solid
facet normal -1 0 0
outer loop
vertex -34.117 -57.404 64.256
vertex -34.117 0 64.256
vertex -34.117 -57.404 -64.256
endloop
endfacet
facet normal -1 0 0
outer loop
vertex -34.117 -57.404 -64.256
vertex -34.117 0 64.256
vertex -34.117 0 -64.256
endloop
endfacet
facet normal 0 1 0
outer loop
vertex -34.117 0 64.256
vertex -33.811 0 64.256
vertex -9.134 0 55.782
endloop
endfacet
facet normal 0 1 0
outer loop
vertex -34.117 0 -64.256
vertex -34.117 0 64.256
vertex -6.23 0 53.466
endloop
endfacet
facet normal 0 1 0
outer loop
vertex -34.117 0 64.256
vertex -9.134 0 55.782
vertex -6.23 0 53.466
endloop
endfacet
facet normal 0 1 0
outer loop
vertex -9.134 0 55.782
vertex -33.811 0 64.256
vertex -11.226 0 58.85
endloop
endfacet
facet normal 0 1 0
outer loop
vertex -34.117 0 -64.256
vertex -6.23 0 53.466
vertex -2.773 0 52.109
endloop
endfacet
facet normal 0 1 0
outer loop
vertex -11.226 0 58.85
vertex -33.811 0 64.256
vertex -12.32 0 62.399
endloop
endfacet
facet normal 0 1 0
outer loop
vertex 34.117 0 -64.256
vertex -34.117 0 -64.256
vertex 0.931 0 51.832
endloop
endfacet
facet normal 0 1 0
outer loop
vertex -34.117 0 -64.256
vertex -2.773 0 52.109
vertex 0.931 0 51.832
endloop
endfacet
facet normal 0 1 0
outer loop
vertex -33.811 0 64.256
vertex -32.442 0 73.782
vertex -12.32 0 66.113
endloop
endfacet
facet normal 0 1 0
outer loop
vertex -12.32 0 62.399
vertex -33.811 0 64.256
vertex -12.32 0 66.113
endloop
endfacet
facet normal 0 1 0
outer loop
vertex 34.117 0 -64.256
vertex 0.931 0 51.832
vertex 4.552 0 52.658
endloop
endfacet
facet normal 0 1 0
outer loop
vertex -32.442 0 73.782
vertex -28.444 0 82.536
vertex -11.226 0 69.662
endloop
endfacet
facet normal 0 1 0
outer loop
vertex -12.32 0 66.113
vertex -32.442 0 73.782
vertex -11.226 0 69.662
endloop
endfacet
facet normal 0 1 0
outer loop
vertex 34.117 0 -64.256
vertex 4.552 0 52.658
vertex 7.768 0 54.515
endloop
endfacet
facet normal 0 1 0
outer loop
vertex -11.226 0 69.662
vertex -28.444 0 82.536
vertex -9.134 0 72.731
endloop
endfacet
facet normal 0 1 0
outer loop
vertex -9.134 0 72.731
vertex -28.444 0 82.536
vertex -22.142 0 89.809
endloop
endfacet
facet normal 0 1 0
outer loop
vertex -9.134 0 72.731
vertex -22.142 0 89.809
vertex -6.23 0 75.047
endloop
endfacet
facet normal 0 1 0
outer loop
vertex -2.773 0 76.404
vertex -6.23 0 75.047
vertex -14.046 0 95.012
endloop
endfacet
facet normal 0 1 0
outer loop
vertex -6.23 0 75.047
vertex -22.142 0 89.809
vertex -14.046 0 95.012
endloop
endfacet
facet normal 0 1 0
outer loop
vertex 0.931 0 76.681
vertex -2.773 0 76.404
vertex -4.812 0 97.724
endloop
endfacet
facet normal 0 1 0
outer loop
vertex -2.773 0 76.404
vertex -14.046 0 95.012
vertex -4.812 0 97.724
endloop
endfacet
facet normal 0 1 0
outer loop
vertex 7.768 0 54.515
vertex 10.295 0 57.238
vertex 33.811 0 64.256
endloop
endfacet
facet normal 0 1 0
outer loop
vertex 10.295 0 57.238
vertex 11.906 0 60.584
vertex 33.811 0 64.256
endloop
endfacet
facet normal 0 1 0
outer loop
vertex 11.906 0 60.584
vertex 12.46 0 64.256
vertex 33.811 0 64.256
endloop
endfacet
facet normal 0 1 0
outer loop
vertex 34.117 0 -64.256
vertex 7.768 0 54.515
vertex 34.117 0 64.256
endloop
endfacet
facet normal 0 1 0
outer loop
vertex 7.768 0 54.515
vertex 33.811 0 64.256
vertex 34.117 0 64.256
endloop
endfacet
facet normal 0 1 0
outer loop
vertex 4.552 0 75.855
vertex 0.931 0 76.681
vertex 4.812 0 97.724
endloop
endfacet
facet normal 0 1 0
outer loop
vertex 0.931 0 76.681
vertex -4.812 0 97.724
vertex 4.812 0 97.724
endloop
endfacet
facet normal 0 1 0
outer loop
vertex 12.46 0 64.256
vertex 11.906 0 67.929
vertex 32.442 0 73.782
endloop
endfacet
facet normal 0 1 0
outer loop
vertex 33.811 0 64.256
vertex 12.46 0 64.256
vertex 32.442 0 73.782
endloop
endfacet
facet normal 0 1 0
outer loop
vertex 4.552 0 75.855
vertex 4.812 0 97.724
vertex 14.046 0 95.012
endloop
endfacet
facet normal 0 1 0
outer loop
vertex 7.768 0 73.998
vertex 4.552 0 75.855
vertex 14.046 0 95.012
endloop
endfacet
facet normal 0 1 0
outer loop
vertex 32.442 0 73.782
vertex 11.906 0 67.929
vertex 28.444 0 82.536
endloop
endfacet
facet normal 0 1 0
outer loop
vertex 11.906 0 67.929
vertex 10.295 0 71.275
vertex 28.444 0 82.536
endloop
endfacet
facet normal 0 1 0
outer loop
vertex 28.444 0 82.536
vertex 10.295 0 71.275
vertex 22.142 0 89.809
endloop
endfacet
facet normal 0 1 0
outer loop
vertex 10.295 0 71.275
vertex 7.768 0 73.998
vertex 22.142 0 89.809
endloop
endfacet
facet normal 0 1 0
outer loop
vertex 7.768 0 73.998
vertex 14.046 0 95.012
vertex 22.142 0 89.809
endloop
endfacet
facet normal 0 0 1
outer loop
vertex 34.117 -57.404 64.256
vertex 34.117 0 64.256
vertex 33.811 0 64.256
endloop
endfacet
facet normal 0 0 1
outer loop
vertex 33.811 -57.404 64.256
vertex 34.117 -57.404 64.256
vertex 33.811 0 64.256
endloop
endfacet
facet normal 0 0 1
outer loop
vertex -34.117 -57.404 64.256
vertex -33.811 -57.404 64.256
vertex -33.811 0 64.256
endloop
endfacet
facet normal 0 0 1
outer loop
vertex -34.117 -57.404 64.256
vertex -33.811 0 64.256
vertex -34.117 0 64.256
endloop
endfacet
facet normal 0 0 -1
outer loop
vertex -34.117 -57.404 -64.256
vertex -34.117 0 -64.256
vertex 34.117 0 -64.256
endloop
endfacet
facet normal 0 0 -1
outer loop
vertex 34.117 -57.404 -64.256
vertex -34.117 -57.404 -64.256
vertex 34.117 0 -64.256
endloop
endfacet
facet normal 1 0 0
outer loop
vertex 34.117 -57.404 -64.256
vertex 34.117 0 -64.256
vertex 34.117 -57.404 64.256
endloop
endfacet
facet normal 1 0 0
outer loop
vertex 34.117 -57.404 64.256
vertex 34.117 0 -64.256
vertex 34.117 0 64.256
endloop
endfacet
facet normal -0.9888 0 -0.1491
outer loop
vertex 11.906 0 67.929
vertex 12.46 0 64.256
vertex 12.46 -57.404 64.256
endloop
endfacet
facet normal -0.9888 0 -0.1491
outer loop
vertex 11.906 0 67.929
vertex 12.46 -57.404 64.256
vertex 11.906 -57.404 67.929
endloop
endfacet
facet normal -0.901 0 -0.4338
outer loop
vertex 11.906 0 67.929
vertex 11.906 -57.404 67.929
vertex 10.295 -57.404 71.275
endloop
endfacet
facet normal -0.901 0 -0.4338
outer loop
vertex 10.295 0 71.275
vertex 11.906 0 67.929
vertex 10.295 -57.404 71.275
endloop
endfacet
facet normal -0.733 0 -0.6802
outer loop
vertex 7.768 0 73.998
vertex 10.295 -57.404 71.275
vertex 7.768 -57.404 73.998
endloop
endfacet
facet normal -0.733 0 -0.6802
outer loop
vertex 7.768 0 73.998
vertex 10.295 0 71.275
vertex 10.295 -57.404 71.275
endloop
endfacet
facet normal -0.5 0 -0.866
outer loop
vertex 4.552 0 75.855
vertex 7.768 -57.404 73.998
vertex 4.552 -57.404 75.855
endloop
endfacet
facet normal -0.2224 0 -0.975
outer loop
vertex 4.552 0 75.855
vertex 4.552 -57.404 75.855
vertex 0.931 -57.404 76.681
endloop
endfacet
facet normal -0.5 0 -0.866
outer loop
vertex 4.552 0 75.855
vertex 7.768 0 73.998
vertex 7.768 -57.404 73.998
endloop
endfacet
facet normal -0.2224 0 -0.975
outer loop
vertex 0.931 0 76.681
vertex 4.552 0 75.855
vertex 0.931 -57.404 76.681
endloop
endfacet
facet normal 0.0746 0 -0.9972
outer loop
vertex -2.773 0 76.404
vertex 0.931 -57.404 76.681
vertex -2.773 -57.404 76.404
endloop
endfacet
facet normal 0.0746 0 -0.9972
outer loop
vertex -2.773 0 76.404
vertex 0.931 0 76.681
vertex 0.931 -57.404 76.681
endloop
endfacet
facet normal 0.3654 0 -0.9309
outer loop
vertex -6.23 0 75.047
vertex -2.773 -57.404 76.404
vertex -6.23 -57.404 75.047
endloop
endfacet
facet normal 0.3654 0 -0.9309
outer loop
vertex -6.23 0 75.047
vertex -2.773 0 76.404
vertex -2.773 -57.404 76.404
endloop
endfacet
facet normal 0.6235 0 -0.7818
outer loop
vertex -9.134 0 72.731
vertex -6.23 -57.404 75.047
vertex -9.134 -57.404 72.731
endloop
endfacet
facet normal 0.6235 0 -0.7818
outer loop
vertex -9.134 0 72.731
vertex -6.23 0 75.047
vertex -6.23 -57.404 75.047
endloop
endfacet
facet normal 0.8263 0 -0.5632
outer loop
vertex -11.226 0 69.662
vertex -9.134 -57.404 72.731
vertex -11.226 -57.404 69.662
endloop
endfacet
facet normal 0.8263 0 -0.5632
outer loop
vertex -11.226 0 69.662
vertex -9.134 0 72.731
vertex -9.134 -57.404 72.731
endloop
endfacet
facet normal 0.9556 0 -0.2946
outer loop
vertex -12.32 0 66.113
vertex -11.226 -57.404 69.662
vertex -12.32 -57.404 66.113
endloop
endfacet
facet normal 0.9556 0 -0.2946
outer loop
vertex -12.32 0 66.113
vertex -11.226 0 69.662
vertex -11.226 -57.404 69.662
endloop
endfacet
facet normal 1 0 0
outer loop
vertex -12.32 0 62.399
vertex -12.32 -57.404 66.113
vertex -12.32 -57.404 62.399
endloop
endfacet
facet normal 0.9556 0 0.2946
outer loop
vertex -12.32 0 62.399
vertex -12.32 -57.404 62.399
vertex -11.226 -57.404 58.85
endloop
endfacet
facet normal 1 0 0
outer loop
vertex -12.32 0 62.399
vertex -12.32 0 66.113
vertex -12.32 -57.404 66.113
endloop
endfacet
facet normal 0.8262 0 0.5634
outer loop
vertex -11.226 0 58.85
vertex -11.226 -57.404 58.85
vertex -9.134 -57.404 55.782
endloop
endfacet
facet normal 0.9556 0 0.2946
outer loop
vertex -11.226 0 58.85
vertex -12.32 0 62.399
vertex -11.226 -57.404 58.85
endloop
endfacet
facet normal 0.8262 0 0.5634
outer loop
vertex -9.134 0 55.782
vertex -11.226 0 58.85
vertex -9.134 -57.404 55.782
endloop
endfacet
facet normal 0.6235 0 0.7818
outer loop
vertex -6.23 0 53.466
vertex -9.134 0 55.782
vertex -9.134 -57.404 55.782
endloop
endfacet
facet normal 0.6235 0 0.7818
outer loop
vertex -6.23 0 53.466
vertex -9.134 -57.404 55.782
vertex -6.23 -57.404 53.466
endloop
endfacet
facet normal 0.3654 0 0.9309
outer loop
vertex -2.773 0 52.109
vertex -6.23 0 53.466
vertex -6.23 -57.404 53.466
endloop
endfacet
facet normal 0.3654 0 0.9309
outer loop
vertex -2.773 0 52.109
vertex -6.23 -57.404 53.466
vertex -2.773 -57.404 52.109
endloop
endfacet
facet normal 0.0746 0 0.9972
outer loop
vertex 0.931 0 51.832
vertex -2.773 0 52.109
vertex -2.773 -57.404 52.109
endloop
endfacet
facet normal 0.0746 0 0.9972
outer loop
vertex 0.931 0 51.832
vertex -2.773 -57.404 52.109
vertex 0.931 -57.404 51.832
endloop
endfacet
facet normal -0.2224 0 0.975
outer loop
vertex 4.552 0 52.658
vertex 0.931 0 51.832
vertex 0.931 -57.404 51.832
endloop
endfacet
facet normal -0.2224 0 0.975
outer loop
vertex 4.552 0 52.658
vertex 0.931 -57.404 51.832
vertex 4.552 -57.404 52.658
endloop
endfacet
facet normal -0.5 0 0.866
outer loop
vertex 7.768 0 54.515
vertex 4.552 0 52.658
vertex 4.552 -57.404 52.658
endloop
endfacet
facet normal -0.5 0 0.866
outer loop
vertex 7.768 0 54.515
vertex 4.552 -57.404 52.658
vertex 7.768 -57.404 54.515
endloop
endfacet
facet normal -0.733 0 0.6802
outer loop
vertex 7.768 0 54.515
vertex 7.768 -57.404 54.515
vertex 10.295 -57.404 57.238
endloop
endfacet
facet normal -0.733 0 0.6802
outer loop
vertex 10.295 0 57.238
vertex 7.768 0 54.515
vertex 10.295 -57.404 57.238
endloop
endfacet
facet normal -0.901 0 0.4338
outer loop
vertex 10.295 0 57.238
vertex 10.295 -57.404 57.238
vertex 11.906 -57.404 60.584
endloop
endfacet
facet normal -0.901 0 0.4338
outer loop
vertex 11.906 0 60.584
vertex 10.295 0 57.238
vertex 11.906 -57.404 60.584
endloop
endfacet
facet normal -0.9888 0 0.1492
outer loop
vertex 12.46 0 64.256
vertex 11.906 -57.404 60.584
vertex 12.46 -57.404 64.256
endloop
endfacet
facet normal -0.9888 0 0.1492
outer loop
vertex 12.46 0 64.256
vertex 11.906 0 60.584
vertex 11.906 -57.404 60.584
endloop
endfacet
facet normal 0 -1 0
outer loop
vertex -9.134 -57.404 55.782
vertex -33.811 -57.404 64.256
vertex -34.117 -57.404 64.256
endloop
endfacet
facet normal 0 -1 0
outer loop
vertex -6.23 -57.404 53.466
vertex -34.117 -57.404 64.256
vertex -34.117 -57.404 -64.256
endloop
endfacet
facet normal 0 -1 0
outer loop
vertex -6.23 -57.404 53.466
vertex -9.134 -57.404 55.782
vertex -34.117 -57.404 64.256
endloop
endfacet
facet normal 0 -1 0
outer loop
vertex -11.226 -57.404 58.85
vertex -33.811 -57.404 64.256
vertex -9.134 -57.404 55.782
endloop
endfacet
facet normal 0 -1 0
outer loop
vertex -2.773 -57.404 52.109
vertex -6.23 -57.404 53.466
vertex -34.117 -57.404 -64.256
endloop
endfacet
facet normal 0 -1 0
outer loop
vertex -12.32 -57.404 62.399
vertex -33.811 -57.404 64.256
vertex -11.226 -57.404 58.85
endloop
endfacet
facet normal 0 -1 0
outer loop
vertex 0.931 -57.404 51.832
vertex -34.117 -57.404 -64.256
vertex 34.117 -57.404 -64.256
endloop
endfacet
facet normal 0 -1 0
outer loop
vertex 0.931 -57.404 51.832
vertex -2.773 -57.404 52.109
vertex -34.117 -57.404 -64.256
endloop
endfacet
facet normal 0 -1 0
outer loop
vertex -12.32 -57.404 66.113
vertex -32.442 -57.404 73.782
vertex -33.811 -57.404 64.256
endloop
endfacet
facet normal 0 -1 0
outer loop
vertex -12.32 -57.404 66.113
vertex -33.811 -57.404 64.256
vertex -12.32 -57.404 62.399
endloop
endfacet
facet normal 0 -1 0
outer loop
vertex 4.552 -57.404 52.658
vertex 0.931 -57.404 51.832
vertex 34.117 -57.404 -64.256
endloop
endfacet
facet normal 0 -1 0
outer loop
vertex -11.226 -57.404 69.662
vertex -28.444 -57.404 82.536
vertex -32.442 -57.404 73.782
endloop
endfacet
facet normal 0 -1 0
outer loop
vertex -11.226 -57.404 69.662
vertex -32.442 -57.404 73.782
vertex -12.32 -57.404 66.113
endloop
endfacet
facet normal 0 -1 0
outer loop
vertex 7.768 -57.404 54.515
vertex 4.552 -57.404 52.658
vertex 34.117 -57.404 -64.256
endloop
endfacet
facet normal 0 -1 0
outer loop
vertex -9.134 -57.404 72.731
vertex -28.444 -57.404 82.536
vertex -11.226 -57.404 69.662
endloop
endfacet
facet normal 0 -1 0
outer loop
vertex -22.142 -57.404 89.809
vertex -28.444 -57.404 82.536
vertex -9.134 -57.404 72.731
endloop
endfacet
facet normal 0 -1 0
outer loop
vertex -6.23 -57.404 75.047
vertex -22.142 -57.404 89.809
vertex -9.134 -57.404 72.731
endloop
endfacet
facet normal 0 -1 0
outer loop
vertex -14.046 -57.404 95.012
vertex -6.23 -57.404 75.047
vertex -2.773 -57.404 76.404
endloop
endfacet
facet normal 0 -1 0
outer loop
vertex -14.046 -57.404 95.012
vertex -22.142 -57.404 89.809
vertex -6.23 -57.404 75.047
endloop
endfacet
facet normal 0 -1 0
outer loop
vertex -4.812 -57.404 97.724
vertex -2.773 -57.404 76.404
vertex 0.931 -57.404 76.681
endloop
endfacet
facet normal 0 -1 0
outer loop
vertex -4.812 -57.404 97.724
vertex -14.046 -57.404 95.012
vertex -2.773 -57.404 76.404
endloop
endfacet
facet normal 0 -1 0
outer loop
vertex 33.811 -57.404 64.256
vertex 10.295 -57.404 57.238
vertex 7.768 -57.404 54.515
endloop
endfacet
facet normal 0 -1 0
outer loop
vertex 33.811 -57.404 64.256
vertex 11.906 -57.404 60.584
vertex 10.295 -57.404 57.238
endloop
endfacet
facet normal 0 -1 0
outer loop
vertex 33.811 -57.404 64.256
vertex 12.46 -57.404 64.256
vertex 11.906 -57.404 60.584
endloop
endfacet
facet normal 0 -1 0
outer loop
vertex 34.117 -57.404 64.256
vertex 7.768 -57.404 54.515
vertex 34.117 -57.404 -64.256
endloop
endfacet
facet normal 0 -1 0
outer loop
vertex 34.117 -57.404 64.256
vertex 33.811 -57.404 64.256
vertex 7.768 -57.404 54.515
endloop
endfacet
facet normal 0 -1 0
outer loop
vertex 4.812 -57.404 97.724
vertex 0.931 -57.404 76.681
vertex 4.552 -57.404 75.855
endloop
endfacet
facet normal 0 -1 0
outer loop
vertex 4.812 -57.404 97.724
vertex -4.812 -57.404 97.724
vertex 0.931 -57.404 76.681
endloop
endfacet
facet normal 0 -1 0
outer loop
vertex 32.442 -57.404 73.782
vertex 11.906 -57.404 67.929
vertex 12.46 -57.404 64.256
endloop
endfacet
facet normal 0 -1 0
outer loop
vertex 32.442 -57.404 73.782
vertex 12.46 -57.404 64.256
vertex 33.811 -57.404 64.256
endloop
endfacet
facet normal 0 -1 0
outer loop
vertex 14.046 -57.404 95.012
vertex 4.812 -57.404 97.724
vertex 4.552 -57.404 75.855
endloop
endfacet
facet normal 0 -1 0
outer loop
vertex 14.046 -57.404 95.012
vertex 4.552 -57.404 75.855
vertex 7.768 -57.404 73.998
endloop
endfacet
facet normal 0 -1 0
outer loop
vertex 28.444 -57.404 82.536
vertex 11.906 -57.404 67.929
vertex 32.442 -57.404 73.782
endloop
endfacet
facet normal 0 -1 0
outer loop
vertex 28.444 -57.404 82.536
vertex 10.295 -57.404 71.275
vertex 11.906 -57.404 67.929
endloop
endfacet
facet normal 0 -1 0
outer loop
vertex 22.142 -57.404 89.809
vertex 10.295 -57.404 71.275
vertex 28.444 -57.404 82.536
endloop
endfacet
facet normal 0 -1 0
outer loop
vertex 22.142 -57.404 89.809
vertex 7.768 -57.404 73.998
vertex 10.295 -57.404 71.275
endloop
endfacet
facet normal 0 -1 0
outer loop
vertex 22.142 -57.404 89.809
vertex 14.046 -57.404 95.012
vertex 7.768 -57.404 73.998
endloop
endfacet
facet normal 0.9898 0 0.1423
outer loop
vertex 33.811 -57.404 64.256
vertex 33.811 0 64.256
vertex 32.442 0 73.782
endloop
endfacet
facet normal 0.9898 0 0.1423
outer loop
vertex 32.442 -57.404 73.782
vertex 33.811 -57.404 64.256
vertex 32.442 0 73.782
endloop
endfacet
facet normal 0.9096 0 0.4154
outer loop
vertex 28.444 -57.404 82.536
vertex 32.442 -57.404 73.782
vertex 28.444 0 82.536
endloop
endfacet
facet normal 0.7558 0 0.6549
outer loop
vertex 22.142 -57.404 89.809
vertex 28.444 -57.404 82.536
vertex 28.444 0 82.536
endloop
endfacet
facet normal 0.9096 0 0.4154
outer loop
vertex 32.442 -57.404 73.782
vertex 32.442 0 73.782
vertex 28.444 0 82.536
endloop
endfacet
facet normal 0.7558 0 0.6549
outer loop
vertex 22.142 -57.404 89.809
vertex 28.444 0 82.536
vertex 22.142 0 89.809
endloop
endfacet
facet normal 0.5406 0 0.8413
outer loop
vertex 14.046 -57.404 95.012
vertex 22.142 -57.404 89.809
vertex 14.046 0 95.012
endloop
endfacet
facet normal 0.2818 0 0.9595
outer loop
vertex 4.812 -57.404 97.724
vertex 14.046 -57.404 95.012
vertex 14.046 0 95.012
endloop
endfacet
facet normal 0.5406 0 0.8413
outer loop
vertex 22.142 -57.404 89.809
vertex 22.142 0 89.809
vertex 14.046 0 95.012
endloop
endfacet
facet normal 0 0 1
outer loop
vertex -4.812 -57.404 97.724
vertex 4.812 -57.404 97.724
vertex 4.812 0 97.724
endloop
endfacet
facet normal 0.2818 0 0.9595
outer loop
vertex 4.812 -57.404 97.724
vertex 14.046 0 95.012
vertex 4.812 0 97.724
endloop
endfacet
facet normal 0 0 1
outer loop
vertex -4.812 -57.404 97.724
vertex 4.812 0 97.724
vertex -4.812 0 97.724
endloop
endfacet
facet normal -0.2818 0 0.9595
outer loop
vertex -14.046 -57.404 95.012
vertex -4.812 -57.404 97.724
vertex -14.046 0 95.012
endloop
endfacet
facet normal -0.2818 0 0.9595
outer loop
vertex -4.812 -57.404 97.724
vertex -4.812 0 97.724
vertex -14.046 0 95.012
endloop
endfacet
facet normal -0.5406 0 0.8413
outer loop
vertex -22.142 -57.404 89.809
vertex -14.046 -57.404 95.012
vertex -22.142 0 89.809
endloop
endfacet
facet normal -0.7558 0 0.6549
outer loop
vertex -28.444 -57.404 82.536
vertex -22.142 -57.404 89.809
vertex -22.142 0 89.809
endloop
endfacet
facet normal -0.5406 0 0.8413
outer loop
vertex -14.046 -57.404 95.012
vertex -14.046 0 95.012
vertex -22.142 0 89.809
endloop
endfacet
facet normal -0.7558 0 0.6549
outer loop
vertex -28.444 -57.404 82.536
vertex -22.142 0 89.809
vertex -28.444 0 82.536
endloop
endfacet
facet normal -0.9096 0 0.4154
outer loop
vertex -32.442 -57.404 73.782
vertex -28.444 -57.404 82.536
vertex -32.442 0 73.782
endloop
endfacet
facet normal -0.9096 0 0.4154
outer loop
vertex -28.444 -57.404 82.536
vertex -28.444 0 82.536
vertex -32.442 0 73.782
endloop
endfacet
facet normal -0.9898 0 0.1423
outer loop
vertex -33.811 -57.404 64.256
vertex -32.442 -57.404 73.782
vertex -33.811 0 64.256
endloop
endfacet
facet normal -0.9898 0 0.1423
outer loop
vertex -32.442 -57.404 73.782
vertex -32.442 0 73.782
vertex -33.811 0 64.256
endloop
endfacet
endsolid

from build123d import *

# Parameters (mm, degrees)
F0_R     = 12.459608
F1_DEPTH = 57.404


with BuildPart() as f1:
    # F0 (on Front) → F1 (new body)
    with BuildSketch(Plane.XZ):
        with BuildLine():
            Line((34.117013, -64.256385), (34.117013, 64.256385))
            Line((34.117013, 64.256385), (33.811439, 64.256385))
            ThreePointArc((33.811439, 64.256385), (0, 98.067824), (-33.811439, 64.256385))
            Line((-33.811439, 64.256385), (-34.117013, 64.256385))
            Line((-34.117013, 64.256385), (-34.117013, -64.256385))
            Line((-34.117013, -64.256385), (34.117013, -64.256385))
        make_face()
        with Locations((0, 64.256385)):
            Circle(F0_R, mode=Mode.SUBTRACT)
    extrude(amount=F1_DEPTH)


solid = f1.part
